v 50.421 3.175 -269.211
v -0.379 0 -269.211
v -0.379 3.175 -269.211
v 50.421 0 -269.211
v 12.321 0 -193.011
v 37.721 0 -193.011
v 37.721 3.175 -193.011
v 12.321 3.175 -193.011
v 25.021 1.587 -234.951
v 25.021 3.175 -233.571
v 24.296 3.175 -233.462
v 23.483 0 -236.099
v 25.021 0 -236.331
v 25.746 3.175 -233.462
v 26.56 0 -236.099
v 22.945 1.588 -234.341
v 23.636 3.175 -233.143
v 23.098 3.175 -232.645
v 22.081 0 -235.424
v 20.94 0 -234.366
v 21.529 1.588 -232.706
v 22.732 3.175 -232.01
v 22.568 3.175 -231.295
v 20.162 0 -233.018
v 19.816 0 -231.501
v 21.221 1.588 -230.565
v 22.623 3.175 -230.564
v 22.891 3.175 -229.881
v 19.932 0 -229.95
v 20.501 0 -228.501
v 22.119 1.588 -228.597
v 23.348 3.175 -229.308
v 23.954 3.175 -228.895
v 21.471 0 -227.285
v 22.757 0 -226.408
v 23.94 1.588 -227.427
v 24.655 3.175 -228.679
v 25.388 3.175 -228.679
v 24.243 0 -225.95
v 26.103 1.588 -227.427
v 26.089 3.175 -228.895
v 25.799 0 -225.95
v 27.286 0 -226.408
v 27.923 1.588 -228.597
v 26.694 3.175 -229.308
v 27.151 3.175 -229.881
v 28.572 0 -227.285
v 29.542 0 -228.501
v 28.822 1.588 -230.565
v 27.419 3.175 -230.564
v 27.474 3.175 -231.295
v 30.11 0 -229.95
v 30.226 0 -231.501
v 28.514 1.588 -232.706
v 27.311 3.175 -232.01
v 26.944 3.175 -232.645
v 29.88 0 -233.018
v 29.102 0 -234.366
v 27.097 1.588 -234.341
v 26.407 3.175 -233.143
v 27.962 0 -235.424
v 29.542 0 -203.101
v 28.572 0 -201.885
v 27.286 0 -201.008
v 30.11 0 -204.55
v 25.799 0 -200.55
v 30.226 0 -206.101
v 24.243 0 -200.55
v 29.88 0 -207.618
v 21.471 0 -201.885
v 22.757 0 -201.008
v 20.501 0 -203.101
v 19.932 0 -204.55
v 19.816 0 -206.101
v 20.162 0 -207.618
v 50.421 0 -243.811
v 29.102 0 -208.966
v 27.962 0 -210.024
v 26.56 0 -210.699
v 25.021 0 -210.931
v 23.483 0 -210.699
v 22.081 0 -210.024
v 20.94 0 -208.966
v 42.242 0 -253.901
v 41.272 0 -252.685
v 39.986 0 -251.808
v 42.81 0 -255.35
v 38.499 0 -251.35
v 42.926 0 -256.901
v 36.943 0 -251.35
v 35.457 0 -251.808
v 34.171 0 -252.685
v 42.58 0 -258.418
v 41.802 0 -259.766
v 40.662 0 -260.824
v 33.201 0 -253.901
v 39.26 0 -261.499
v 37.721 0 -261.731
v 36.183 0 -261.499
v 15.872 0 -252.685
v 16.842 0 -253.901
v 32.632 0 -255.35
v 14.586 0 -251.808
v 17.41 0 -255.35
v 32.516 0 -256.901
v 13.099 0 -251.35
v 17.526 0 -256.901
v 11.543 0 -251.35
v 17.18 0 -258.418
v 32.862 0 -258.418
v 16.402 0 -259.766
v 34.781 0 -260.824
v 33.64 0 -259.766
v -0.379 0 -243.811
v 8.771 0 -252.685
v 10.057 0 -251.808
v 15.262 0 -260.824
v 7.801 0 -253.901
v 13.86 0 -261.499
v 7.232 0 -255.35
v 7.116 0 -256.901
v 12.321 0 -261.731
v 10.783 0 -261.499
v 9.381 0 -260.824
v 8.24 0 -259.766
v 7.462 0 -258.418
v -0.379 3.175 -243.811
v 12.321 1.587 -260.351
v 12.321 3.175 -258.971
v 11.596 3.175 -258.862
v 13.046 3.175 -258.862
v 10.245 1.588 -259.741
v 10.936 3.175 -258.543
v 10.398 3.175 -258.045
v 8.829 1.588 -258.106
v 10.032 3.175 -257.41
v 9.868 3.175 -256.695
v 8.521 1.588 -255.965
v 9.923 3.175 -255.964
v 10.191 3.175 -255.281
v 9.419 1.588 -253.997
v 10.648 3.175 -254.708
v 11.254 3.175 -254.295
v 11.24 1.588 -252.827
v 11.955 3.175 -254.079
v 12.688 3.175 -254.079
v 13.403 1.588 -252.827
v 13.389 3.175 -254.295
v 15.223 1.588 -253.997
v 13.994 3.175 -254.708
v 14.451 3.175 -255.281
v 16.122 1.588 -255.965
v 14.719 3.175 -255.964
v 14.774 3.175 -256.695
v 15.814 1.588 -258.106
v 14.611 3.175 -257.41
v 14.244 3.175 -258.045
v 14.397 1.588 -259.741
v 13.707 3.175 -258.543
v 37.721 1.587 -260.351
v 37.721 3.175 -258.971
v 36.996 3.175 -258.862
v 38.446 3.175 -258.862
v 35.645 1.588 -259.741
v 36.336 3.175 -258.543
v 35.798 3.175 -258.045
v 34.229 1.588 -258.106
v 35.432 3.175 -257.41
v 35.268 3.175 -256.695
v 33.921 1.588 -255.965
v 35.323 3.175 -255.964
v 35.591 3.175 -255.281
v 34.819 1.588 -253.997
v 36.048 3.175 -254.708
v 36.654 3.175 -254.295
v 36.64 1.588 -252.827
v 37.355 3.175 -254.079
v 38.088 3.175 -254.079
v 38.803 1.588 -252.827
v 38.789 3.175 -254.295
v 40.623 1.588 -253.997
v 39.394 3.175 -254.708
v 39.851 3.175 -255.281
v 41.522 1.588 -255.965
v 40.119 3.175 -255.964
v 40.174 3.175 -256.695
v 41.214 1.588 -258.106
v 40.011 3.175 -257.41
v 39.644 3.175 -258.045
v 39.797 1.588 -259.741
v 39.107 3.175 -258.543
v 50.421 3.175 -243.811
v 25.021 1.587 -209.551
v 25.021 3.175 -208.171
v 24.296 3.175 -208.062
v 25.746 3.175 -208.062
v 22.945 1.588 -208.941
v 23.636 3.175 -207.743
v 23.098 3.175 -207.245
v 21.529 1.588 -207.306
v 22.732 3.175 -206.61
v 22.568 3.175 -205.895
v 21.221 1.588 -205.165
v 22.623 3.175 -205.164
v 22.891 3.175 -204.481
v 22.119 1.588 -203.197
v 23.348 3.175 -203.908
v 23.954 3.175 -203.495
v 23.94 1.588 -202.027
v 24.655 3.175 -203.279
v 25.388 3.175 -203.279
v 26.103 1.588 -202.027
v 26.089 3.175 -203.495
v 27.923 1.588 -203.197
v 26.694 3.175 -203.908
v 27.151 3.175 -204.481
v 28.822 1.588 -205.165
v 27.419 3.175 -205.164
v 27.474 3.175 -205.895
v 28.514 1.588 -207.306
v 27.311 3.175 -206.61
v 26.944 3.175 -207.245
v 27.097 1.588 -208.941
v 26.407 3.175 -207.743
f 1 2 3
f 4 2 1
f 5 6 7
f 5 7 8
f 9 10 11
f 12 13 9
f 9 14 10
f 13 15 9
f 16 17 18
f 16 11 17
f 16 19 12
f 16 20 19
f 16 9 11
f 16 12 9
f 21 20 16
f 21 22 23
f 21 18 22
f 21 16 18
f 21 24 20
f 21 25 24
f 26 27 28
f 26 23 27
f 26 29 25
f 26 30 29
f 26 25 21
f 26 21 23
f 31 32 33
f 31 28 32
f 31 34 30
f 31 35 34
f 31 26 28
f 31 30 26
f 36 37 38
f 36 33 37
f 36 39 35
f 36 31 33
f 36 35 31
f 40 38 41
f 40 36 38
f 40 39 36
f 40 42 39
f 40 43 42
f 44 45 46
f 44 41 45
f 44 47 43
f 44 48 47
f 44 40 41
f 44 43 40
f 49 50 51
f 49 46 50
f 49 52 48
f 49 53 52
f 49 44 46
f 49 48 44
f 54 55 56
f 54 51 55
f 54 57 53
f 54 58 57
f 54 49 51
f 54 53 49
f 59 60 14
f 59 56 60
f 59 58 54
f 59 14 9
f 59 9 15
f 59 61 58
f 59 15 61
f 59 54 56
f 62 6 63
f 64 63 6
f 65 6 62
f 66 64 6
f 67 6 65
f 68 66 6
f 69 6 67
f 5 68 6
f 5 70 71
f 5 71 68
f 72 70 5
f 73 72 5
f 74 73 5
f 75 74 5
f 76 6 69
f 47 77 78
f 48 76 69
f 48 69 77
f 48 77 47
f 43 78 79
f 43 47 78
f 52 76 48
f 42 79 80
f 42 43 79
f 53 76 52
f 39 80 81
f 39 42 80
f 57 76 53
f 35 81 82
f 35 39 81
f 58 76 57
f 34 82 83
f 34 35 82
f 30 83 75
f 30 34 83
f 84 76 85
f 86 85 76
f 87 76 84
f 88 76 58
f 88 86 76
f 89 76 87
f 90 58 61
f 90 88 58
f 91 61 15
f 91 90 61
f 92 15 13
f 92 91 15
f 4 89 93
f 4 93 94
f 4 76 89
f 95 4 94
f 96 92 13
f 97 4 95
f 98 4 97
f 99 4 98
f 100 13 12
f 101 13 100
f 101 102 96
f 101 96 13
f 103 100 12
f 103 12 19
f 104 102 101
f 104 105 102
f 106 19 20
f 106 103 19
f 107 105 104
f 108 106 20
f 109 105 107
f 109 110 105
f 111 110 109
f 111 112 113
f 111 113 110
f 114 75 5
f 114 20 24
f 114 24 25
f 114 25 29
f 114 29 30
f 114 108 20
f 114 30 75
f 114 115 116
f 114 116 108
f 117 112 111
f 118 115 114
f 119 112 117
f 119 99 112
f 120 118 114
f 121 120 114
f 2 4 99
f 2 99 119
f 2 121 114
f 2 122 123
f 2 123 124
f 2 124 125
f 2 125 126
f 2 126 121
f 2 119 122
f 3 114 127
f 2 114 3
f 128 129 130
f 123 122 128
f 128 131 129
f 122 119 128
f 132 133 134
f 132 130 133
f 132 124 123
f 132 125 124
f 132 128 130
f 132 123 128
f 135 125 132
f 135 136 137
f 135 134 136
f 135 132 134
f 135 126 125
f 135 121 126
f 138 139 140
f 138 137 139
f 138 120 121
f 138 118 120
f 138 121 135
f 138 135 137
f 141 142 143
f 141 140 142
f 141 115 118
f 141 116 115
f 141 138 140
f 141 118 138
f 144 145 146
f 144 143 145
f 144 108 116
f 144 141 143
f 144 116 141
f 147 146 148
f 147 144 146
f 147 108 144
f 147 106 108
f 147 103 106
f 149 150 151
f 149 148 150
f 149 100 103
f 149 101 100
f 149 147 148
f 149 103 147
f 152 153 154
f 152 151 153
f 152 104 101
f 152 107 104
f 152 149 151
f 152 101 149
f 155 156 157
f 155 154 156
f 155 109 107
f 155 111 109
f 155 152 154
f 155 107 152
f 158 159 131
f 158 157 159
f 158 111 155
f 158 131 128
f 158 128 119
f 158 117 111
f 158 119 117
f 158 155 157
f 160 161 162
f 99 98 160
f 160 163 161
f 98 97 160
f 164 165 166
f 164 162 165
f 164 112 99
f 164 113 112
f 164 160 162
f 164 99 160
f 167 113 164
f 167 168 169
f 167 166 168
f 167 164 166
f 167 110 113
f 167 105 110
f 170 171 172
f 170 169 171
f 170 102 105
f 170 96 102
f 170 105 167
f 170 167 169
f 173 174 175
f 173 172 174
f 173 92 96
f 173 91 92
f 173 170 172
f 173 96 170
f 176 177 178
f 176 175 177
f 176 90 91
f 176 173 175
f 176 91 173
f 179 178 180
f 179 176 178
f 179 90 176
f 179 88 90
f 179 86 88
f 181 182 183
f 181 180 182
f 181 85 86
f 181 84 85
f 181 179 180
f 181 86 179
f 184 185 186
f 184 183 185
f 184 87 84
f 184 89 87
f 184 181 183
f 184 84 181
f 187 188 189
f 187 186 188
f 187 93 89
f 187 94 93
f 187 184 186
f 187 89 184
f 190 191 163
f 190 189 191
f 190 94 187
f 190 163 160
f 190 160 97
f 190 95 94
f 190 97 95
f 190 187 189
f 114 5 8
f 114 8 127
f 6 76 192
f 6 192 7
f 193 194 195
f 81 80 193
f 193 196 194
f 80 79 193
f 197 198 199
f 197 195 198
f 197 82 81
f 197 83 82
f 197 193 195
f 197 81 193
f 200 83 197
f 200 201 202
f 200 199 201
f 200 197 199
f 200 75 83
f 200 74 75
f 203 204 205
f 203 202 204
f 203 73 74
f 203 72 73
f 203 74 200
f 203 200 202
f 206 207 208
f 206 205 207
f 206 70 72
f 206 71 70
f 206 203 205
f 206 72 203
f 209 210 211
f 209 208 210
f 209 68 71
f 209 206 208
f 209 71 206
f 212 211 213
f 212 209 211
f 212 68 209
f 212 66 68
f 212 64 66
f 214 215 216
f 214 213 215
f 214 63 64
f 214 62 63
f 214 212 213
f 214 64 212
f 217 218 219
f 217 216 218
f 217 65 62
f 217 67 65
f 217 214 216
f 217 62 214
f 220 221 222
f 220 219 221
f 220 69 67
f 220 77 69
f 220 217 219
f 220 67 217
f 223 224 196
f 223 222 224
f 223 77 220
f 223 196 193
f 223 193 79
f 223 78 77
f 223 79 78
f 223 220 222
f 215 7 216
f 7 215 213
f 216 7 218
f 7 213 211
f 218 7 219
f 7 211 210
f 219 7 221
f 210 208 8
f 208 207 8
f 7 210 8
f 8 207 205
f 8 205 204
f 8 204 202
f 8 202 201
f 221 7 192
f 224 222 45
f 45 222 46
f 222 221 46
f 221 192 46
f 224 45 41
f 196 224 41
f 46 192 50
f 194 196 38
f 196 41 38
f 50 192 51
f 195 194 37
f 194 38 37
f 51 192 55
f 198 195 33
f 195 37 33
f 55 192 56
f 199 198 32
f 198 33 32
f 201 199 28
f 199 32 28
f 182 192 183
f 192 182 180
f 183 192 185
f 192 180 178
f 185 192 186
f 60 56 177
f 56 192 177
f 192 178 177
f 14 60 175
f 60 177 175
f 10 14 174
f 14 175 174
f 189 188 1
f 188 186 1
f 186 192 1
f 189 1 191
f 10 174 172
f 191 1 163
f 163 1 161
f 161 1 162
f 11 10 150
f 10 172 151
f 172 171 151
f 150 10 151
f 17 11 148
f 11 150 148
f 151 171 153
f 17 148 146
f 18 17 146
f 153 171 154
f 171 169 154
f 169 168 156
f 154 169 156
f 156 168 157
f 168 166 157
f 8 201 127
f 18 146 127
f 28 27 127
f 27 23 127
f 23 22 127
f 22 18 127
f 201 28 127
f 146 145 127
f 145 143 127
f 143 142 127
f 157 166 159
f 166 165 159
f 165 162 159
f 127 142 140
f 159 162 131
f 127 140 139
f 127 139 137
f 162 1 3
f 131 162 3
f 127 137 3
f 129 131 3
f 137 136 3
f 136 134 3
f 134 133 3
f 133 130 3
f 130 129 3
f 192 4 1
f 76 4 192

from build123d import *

# Parameters (mm, degrees)
BOSS_EXTRUDE1_DEPTH                   = 3.175
F_10_0_1935_DIAMETER_HOLE1_AT_2_COUNT = 2
F_10_0_1935_DIAMETER_HOLE1_AT_2_PITCH = 25.4
F_10_0_1935_DIAMETER_HOLE1_AT_3_COUNT = 2
F_10_0_1935_DIAMETER_HOLE1_AT_3_PITCH = 28.398063314
F_10_0_1935_DIAMETER_HOLE1_AT_4_COUNT = 2
F_10_0_1935_DIAMETER_HOLE1_AT_4_PITCH = 52.363441445


with BuildPart() as part:
    # Sketch2 → Boss-Extrude1 (new body)
    with BuildSketch(Plane(origin=(0, 0, 0), x_dir=(1, 0, 0), z_dir=(0, 1, 0))):
        Polygon((-0.378728756, 269.21115375), (50.421271244, 269.21115375), (50.421271244, 243.81115375), (37.721271244, 193.01115375), (12.321271244, 193.01115375), (-0.378728756, 243.81115375), align=None)
    extrude(amount=BOSS_EXTRUDE1_DEPTH)

    # Sketch7 → #10 (0.1935) Diameter Hole1 (revolve, cut)
    with BuildSketch(Plane(origin=(37.721271244, 0, -256.51115375), x_dir=(0, 0, -1), z_dir=(1, 0, 0))):
        Polygon((0, 0), (0, 3.175), (2.45745, 3.175), (2.45745, 3.177605133), (5.2197, 0), align=None)
    f_10_0_1935_diameter_hole1 = revolve(axis=Axis((37.721271244, -6.35, -256.51115375), (0, 1, 0)), mode=Mode.SUBTRACT)

    # #10 (0.1935) Diameter Hole1 at 2: #10 (0.1935) Diameter Hole1 ×2
    with Locations(*[(-i * F_10_0_1935_DIAMETER_HOLE1_AT_2_PITCH, 0, 0) for i in range(1, F_10_0_1935_DIAMETER_HOLE1_AT_2_COUNT)]):
        add(f_10_0_1935_diameter_hole1, mode=Mode.SUBTRACT)

    # #10 (0.1935) Diameter Hole1 at 3: #10 (0.1935) Diameter Hole1 ×2
    with Locations(*[Vector(-0.44721359549995443, 0, 0.8944271909999176) * (i * F_10_0_1935_DIAMETER_HOLE1_AT_3_PITCH) for i in range(1, F_10_0_1935_DIAMETER_HOLE1_AT_3_COUNT)]):
        add(f_10_0_1935_diameter_hole1, mode=Mode.SUBTRACT)

    # #10 (0.1935) Diameter Hole1 at 4: #10 (0.1935) Diameter Hole1 ×2
    with Locations(*[Vector(-0.24253562503633175, 0, 0.9701425001453322) * (i * F_10_0_1935_DIAMETER_HOLE1_AT_4_PITCH) for i in range(1, F_10_0_1935_DIAMETER_HOLE1_AT_4_COUNT)]):
        add(f_10_0_1935_diameter_hole1, mode=Mode.SUBTRACT)


solid = part.part
